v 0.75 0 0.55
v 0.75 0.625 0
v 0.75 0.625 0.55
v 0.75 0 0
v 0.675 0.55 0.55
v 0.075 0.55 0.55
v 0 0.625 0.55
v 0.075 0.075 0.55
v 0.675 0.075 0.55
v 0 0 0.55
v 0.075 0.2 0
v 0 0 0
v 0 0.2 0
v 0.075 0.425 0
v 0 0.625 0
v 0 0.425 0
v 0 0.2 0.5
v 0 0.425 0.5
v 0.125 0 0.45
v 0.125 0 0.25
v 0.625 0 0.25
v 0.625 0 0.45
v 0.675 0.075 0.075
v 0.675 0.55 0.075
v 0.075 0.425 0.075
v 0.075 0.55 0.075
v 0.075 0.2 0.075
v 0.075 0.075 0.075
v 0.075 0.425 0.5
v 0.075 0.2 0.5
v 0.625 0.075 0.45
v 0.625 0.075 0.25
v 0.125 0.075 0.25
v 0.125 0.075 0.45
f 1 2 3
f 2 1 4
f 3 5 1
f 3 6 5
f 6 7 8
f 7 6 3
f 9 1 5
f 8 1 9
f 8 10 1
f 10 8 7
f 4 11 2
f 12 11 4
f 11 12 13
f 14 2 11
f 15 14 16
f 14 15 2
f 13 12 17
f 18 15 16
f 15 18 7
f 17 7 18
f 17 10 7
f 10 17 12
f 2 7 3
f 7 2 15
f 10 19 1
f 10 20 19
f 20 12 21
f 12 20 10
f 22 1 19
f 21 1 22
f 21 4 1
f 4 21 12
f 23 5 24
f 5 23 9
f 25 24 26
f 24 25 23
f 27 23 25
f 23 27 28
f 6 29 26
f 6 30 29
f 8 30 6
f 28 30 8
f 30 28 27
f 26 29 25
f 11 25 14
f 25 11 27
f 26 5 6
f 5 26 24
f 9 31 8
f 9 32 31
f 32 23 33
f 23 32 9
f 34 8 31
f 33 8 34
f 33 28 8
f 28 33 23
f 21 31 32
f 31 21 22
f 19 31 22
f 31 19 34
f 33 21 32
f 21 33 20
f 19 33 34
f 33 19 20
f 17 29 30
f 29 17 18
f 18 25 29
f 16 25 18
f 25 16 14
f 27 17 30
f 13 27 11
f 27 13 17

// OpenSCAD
// Parametric Design - Main Reference Dimensions
outer_width = 0.75;      // X dimension
outer_depth = 0.625;     // Y dimension  
outer_height = 0.55;     // Z dimension (base to top)
wall_thickness = 0.075;  // Wall thickness (derived from cuts)

// Front Cut Parameters
front_cut_length = 0.5;
front_cut_margin = 0.125;
front_cut_bottom = 0.25;
front_cut_top = 0.45;
front_cut_depth = 0.075;

// Left Cut Parameters  
left_cut_length = 0.225;
left_cut_front_margin = 0.2;
left_cut_back_margin = 0.2;
left_cut_bottom = 0;
left_cut_top = 0.5;
left_cut_depth = 0.075;

// Internal Ledge Parameters
ledge_length = 0.5;
ledge_width = 0.1;
ledge_thickness = 0.0125;
ledge_side_margin = 0.125;

// Resolution
$fn = 100;

// Module: Main hollow enclosure
module main_enclosure() {
    difference() {
        // Outer solid block
        cube([outer_width, outer_depth, outer_height]);
        
        // Inner void (open top)
        translate([wall_thickness, wall_thickness, wall_thickness])
            cube([
                outer_width - 2*wall_thickness,
                outer_depth - 2*wall_thickness,
                outer_height  // Open top - cut through entire height
            ]);
    }
}

// Module: Front horizontal cut
module front_cut() {
    // Calculate X position (centered with margins)
    front_cut_x = front_cut_margin;
    
    // Position and create cut
    translate([front_cut_x, 0, front_cut_bottom])
        cube([front_cut_length, front_cut_depth, front_cut_top - front_cut_bottom]);
}

// Module: Left vertical cut  
module left_cut() {
    // Calculate Y position (centered with margins)
    left_cut_y = left_cut_front_margin;
    
    // Position and create cut
    translate([0, left_cut_y, left_cut_bottom])
        cube([left_cut_depth, left_cut_length, left_cut_top - left_cut_bottom]);
}

// Module: Internal ledge
module internal_ledge() {
    // Calculate X position (centered with margins)
    ledge_x = ledge_side_margin;
    
    // Position ledge on front inside wall
    translate([ledge_x, wall_thickness, 0])
        cube([ledge_length, ledge_width, ledge_thickness]);
}

// Main assembly
difference() {
    // Create main hollow enclosure
    main_enclosure();
    
    // Subtract front cut
    front_cut();
    
    // Subtract left cut
    left_cut();
}

// Add internal ledge (separate solid addition)
internal_ledge();
